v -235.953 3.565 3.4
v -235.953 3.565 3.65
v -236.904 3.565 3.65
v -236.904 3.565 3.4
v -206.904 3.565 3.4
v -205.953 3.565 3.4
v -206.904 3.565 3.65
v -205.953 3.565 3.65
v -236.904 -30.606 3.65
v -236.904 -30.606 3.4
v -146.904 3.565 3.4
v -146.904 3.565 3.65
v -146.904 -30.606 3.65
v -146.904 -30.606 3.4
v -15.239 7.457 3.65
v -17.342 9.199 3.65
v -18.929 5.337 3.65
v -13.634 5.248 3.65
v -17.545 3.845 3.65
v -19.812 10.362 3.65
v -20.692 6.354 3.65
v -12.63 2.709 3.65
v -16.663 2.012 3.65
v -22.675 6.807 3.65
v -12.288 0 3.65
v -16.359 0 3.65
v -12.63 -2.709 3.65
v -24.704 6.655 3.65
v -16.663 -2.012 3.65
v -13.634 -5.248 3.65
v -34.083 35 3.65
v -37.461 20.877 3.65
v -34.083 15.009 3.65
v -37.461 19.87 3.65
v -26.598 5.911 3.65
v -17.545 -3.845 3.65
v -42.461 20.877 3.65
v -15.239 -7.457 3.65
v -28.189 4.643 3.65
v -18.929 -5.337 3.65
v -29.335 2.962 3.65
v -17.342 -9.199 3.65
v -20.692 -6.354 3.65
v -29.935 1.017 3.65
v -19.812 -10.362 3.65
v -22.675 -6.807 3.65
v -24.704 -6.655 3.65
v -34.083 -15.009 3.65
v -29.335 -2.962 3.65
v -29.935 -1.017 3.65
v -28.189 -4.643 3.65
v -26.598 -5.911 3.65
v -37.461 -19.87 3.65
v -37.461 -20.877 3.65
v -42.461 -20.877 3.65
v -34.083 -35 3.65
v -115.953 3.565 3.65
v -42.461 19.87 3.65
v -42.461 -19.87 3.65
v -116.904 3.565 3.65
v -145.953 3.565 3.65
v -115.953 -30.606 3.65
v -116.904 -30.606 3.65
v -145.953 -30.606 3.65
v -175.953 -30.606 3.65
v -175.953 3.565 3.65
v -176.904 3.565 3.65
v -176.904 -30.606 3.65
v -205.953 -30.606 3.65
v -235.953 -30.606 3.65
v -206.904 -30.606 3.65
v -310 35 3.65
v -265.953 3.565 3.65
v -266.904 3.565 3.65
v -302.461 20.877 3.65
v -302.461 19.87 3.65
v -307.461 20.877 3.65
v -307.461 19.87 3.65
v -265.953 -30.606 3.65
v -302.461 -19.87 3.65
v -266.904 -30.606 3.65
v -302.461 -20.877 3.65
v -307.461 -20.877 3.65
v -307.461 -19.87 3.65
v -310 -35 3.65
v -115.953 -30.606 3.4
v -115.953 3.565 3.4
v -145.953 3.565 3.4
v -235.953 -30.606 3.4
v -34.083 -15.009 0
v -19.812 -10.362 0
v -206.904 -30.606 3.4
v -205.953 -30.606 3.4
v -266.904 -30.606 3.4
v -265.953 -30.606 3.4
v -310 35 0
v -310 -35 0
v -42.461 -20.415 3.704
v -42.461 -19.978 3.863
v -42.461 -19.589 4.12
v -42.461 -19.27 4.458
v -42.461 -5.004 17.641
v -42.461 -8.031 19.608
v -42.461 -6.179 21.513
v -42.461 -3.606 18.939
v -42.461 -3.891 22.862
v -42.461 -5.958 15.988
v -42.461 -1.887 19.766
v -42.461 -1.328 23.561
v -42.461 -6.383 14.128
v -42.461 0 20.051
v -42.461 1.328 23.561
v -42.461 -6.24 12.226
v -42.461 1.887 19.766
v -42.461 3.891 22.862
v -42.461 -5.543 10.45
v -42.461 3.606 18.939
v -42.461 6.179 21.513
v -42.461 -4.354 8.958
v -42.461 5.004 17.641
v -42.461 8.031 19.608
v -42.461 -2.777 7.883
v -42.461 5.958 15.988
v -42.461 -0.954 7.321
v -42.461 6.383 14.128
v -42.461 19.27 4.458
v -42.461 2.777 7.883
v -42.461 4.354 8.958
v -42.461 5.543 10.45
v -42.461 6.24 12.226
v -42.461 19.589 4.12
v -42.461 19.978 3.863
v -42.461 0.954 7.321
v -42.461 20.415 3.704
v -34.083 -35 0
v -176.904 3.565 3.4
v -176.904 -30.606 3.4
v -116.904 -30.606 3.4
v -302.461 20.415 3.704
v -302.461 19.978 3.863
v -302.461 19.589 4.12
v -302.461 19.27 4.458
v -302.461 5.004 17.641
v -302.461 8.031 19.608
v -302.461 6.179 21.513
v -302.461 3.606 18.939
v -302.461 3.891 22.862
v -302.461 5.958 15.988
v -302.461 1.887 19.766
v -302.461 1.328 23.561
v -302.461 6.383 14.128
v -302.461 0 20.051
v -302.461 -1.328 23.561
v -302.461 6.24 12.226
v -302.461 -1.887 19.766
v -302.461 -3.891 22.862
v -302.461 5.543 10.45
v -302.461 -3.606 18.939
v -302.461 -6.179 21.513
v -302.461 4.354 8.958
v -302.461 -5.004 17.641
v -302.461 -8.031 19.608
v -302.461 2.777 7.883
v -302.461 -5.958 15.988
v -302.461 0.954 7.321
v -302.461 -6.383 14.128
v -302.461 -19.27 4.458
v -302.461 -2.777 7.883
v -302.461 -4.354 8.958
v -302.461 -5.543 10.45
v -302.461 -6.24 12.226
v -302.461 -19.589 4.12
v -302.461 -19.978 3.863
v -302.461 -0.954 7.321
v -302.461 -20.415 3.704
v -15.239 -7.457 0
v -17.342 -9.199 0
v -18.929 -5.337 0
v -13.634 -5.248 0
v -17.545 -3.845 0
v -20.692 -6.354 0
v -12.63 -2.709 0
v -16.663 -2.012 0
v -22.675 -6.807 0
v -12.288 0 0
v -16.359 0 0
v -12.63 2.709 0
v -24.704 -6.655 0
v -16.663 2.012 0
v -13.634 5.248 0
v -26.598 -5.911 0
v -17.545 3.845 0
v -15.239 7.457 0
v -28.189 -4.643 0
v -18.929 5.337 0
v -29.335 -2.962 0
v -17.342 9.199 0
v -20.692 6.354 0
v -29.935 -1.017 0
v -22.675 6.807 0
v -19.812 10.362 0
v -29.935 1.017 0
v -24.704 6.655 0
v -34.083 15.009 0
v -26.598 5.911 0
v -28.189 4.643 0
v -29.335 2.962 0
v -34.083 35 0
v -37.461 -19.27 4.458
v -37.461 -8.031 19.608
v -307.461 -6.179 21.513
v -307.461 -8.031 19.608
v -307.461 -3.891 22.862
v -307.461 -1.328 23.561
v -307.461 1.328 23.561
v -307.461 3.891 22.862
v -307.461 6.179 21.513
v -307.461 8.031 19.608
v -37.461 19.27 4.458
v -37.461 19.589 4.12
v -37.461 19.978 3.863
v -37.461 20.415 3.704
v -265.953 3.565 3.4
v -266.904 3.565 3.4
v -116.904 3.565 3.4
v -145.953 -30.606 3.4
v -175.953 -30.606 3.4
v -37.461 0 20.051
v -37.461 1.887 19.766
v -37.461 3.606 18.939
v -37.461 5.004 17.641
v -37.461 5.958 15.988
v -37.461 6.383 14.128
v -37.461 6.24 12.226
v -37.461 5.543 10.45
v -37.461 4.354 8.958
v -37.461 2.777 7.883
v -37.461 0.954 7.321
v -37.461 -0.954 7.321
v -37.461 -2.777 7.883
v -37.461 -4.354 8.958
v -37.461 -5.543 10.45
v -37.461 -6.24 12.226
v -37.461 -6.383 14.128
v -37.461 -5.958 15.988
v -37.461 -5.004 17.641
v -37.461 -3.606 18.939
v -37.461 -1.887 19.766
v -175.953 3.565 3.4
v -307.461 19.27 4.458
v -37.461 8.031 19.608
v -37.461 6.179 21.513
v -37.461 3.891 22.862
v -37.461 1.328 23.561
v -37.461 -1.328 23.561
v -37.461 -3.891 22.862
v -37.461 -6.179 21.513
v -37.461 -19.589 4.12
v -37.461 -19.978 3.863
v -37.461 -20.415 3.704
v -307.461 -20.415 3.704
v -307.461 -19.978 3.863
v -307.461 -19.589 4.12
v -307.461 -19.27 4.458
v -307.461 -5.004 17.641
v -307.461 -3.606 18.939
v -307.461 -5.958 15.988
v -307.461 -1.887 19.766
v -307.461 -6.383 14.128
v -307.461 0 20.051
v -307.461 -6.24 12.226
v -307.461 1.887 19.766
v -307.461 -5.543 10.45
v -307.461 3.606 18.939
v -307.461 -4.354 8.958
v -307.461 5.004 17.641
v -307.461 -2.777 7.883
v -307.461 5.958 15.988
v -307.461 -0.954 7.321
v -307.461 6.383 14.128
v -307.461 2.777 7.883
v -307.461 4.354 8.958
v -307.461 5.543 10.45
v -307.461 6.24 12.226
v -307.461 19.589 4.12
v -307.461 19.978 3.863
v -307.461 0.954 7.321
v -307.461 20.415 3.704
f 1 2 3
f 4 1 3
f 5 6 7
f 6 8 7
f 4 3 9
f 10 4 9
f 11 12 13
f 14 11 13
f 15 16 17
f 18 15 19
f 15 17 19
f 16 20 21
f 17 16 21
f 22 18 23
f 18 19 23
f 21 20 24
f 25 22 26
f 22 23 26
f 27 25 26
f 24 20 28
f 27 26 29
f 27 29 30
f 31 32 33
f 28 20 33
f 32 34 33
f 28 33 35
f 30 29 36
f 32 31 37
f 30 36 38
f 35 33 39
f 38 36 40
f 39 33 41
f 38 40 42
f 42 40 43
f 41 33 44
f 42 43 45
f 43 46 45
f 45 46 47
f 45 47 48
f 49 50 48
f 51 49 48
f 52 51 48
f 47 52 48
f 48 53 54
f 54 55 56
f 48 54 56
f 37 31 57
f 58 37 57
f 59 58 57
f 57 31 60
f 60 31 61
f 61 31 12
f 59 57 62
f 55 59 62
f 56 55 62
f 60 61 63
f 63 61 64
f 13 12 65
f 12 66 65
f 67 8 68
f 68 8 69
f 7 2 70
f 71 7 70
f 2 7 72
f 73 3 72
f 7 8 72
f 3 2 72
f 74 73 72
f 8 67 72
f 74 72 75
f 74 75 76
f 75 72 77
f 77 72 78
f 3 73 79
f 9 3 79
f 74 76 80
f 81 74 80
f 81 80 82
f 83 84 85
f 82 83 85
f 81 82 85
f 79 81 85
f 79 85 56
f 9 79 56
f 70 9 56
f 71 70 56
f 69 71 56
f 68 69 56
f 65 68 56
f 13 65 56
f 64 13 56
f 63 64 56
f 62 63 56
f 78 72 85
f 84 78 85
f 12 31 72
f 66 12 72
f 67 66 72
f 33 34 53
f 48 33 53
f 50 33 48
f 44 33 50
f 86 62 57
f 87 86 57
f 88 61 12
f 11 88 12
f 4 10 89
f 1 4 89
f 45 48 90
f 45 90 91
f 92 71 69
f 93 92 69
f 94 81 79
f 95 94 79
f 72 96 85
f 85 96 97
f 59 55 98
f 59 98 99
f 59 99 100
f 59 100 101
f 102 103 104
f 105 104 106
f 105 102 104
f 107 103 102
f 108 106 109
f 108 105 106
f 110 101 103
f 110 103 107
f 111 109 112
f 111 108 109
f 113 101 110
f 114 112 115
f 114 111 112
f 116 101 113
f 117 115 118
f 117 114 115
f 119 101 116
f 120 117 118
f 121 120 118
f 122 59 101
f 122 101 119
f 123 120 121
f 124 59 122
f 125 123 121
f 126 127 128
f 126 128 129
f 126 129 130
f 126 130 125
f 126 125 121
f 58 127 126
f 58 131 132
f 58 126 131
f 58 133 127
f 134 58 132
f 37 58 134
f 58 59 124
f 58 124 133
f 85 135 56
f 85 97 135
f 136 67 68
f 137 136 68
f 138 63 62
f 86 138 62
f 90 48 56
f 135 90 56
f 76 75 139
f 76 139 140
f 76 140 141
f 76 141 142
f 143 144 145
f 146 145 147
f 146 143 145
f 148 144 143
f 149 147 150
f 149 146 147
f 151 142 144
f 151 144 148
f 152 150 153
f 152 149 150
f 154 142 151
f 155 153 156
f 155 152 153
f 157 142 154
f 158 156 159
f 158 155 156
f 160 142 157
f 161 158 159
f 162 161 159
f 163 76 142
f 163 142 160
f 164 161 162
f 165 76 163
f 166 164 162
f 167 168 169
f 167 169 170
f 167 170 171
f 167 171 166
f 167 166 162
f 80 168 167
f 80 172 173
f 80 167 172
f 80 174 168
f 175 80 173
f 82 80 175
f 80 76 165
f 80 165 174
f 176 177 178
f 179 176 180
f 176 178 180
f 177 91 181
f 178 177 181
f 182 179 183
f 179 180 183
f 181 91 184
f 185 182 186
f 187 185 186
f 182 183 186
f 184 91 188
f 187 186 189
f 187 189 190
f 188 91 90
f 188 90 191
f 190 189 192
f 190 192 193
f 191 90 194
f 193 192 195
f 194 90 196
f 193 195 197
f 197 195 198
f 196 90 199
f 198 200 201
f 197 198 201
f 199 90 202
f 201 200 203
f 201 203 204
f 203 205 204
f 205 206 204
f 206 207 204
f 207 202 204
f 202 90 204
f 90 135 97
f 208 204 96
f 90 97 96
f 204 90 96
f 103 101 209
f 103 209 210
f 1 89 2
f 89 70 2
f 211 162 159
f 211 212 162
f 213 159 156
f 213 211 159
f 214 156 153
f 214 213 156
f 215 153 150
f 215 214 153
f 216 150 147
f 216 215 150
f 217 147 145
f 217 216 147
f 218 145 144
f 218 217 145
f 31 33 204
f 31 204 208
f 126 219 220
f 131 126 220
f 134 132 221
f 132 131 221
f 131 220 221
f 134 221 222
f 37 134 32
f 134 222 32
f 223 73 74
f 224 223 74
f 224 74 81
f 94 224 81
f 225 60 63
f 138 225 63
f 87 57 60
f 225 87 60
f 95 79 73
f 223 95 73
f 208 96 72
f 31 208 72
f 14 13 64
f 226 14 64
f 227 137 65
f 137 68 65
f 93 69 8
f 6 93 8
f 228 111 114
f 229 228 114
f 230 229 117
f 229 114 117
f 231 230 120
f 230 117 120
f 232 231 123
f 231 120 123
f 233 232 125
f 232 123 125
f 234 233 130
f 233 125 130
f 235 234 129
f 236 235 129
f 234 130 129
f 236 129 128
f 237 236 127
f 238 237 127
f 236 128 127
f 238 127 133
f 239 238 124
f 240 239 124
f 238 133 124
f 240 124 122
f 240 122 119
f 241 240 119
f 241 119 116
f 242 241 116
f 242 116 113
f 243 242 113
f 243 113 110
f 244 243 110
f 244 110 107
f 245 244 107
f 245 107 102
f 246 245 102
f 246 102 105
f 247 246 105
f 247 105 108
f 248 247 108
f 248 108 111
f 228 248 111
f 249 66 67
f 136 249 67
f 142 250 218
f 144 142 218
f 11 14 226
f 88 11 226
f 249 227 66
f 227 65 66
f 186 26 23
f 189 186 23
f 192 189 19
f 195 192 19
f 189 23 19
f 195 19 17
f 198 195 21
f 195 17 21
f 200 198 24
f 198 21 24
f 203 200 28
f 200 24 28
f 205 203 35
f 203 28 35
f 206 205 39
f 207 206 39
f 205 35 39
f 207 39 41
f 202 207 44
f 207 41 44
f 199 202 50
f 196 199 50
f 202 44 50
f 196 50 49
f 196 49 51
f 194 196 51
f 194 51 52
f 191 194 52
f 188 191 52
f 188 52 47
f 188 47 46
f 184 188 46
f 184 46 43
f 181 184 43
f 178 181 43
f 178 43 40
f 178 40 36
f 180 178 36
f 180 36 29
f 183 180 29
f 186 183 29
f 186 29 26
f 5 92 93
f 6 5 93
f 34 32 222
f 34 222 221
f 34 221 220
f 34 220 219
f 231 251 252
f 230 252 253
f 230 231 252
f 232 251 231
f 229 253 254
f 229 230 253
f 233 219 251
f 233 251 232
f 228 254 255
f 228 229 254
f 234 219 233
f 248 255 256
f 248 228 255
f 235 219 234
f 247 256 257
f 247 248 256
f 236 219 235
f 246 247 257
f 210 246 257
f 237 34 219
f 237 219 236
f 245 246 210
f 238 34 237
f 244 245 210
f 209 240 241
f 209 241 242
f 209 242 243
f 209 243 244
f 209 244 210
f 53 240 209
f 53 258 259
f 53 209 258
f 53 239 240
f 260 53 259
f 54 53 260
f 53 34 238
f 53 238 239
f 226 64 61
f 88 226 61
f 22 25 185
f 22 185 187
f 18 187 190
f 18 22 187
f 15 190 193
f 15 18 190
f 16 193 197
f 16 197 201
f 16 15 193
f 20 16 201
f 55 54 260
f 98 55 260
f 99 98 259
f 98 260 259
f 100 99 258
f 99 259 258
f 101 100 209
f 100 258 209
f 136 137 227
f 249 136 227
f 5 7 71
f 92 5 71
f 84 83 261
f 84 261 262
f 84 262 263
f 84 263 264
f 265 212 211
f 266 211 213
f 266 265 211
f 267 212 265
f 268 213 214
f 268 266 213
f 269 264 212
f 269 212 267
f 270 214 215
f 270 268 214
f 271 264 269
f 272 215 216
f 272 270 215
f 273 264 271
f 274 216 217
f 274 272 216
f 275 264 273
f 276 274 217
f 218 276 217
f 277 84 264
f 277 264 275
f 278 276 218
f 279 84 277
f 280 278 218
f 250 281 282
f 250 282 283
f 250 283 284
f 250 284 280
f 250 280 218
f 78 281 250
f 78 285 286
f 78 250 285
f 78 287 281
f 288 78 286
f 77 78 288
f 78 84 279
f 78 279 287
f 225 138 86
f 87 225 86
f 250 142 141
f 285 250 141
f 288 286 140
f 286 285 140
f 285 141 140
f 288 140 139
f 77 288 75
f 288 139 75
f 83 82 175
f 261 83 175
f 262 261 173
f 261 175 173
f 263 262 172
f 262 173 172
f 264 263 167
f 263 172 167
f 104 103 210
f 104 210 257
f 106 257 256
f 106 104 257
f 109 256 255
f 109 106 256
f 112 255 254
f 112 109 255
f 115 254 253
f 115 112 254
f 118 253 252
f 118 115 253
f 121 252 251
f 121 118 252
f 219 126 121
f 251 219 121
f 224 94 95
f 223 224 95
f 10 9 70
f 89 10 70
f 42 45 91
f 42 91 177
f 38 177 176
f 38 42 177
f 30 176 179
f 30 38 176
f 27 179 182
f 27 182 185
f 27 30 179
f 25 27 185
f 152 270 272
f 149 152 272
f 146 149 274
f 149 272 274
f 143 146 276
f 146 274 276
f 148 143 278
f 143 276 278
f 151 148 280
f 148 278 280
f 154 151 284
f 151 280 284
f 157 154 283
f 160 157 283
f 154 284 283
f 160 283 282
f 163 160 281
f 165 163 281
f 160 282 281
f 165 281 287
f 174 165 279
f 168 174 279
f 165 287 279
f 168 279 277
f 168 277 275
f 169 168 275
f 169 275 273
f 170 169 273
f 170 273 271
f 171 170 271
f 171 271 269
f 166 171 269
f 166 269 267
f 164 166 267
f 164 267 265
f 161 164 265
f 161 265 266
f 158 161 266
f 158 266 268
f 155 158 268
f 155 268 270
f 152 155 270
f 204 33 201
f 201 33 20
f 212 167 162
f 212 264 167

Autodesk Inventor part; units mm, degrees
ref_plane "YZ Plane" through (0, 0, 0) normal (1, 0, 0) x (0, 1, 0)
ref_plane "XZ Plane" through (0, 0, 0) normal (0, 1, 0) x (-1, 0, 0)
ref_plane "XY Plane" through (0, 0, 0) normal (0, 0, 1) x (1, 0, 0)
sketch "Sketch1" plane through (0, 0, 0) normal (0, 0, 1) x (1, 0, 0)
  point P0 (0, 0)
sketch "Sketch2" plane through (0, 0, 0) normal (0, 0, 1) x (1, 0, 0)
  line L0 (-30, 35) -> (-310, 35)
  line L1 (-310, 35) -> (-310, -35)
  line L2 (-310, -35) -> (-30, -35)
  line L3 (-30, -35) -> (-30, 35)
  line L4 (-310, 35) -> (-30, -35) construction
  line L5 (-30, 35) -> (-310, -35) construction
  line L6 (0, 0) -> (-620.4685, 0)
  point P0 (-170, 0)
  dimension "d0" = 280
  dimension "d1" = 70
  dimension "d2" = 30
extrude "Extrusion1" add sketch "Sketch2" along normal blind 3.65
sketch "Sketch3" plane through (0, 0, 3.65) normal (0, 0, 1) x (1, 0, 0)
  line L0 (-30, 35) -> (-30, -35) projected
  line L1 (-310, -35) -> (-310, 35) projected
  line L2 (-30, 0) -> (-310, 0) construction
  line L3 (-42.4613, 25) -> (-37.4613, 25)
  line L4 (-37.4613, 25) -> (-37.4613, -25)
  line L5 (-37.4613, -25) -> (-42.4613, -25)
  line L6 (-42.4613, -25) -> (-42.4613, 25)
  line L7 (-37.4613, 25) -> (-42.4613, -25) construction
  line L8 (-42.4613, 25) -> (-37.4613, -25) construction
  point P0 (0, 0)
  point P1 (-39.9613, 0)
  dimension "d5" = 5
  dimension "d6" = 50
extrude "Extrusion2" add sketch "Sketch3" along normal blind 35.4
sketch "Sketch4" plane through (-42.4613, -25, 3.65) normal (-1, 0, 0) x (0, 0, 1)
  line L0 (35.4, 0) -> (35.4, 50) projected
  line L1 (0, 50) -> (35.4, 50) projected
  line L2 (0, 0) -> (0, 50) projected
  line L3 (0, 0) -> (35.4, 0) projected
  circle A0 centre (10, 25) radius 10 construction
  line L4 (35.4, 25) -> (-31.6063, 25)
  line L5 (0, 44.8702) -> (15.9582, 33.0312)
  line L6 (0, 5.1298) -> (15.9582, 16.9688)
  circle A1 centre (10, 25) radius 6.4008
  arc A2 (15.9582, 16.9688) -> (15.9582, 33.0312) centre (10, 25) ccw
  line L7 (0, 60) -> (0, -10) projected
  line L8 (0, 50) -> (35.4, 0) construction
  line L9 (35.4, 50) -> (0, 0) construction
  line L10 (0, -10) -> (0, 60) projected
  point P0 (-3.65, 25)
  point P1 (17.7, 25)
  point P2 (17.7, 25)
  dimension "d9" = 20
extrude "Extrusion3" cut sketch "Sketch4" against normal through all contours L3 L2 L6 A2 L4 L0 | L4 A2 L5 L2 L1 L0 | A1 L4 | L4 A1
pattern_linear "Rectangular Pattern1" count 2 spacing 265 along (-1, 0, 0) of "Extrusion3", "Extrusion2"
sketch "Sketch5" plane through (0, 0, 3.65) normal (0, 0, 1) x (1, 0, 0)
  line L0 (-30, -35) -> (-310, -35) projected
  line L1 (-115.953, 3.5653) -> (-116.904, 3.5653)
  line L2 (-116.904, 3.5653) -> (-116.904, -30.6059)
  line L3 (-116.904, -30.6059) -> (-115.953, -30.6059)
  line L4 (-115.953, -30.6059) -> (-115.953, 3.5653)
  line L5 (-85.953, 3.5653) -> (-86.904, 3.5653)
  line L6 (-86.904, 3.5653) -> (-86.904, -30.6059)
  line L7 (-86.904, -30.6059) -> (-85.953, -30.6059)
  line L8 (-85.953, -30.6059) -> (-85.953, 3.5653)
  line L9 (-55.953, 3.5653) -> (-56.904, 3.5653)
  line L10 (-56.904, 3.5653) -> (-56.904, -30.6059)
  line L11 (-56.904, -30.6059) -> (-55.953, -30.6059)
  line L12 (-55.953, -30.6059) -> (-55.953, 3.5653)
  line L13 (-25.953, 3.5653) -> (-26.904, 3.5653)
  line L14 (-26.904, 3.5653) -> (-26.904, -30.6059)
  line L15 (-26.904, -30.6059) -> (-25.953, -30.6059)
  line L16 (-25.953, -30.6059) -> (-25.953, 3.5653)
  line L17 (4.047, 3.5653) -> (3.096, 3.5653)
  line L18 (3.096, 3.5653) -> (3.096, -30.6059)
  line L19 (3.096, -30.6059) -> (4.047, -30.6059)
  line L20 (4.047, -30.6059) -> (4.047, 3.5653)
  line L21 (34.047, 3.5653) -> (33.096, 3.5653)
  line L22 (33.096, 3.5653) -> (33.096, -30.6059)
  line L23 (33.096, -30.6059) -> (34.047, -30.6059)
  line L24 (34.047, -30.6059) -> (34.047, 3.5653)
  point P0 (0, 0)
  dimension "d17" = 30
extrude "Extrusion4" cut sketch "Sketch5" against normal blind 0.25 contours L4 L3 L2 L1
pattern_linear "Rectangular Pattern2" count 6 spacing 30 along (-1, 0, 0) of "Extrusion4"
sketch "Sketch6" plane through (-30, -35, 0) normal (1, 0, 0) x (0, 0, -1)
  line L0 (-3.65, 70) -> (-3.65, 0) projected
  line L1 (0, 0) -> (-3.65, 0) projected
  line L2 (0, 0) -> (0, 70) projected
  line L3 (0, 70) -> (-3.65, 70) projected
  point P0 (0, 35)
extrude "Extrusion5" add sketch "Sketch6" along normal blind 17.7125
sketch "Sketch7" plane through (0, 0, 3.65) normal (0, 0, 1) x (1, 0, 0)
  line L0 (-266.904, -30.6059) -> (-266.904, 3.5653) projected
  line L1 (-266.904, 3.5653) -> (-265.953, 3.5653) projected
  line L2 (-265.953, 3.5653) -> (-265.953, -30.6059) projected
  line L3 (-265.953, -30.6059) -> (-266.904, -30.6059) projected
  line L4 (-236.904, -30.6059) -> (-236.904, 3.5653) projected
  line L5 (-236.904, 3.5653) -> (-235.953, 3.5653) projected
  line L6 (-235.953, 3.5653) -> (-235.953, -30.6059) projected
  line L7 (-235.953, -30.6059) -> (-236.904, -30.6059) projected
  line L8 (-206.904, -30.6059) -> (-206.904, 3.5653) projected
  line L9 (-206.904, 3.5653) -> (-205.953, 3.5653) projected
  line L10 (-205.953, 3.5653) -> (-205.953, -30.6059) projected
  line L11 (-205.953, -30.6059) -> (-206.904, -30.6059) projected
  line L12 (-176.904, -30.6059) -> (-176.904, 3.5653) projected
  line L13 (-176.904, 3.5653) -> (-175.953, 3.5653) projected
  line L14 (-175.953, 3.5653) -> (-175.953, -30.6059) projected
  line L15 (-175.953, -30.6059) -> (-176.904, -30.6059) projected
  line L16 (-146.904, -30.6059) -> (-146.904, 3.5653) projected
  line L17 (-146.904, 3.5653) -> (-145.953, 3.5653) projected
  line L18 (-145.953, 3.5653) -> (-145.953, -30.6059) projected
  line L19 (-145.953, -30.6059) -> (-146.904, -30.6059) projected
  line L20 (-116.904, -30.6059) -> (-116.904, 3.5653) projected
  line L21 (-116.904, 3.5653) -> (-115.953, 3.5653) projected
  line L22 (-115.953, 3.5653) -> (-115.953, -30.6059) projected
  line L23 (-115.953, -30.6059) -> (-116.904, -30.6059) projected
  line L24 (-302.4613, 19.8702) -> (-302.4613, -19.8702) projected
  line L25 (-307.4613, -19.8702) -> (-302.4613, -19.8702) projected
  line L26 (-307.4613, -19.8702) -> (-307.4613, 19.8702) projected
  line L27 (-307.4613, 19.8702) -> (-302.4613, 19.8702) projected
  line L28 (-310, 35) -> (-12.2875, 35) projected
  line L29 (-310, -35) -> (-310, 35) projected
  line L30 (-12.2875, -35) -> (-310, -35) projected
  line L31 (-12.2875, -35) -> (-12.2875, 35) projected
  line L32 (-42.4613, -19.8702) -> (-42.4613, 19.8702) projected
  line L33 (-42.4613, 19.8702) -> (-37.4613, 19.8702) projected
  line L34 (-37.4613, 19.8702) -> (-37.4613, -19.8702) projected
  line L35 (-42.4613, -19.8702) -> (-37.4613, -19.8702) projected
  line L36 (-12.2875, 35) -> (-12.2875, -35)
  circle A0 centre (-23.1854, 0) radius 10.8979 construction
  line L37 (-12.2875, -35) -> (-12.2875, 35) projected
  line L38 (-34.0833, 15.009) -> (-19.8116, 10.3625)
  line L39 (-34.0833, 15.009) -> (-34.0833, 35)
  line L40 (-12.2875, 35) -> (-12.2875, 0)
  arc A1 (-12.2875, 0) -> (-19.8116, 10.3625) centre (-23.1854, 0) ccw
  line L41 (-310, 0) -> (-198.3644, 0)
  circle A2 centre (-23.1854, 0) radius 10.8979 construction
  line L42 (-34.0833, -15.009) -> (-19.8116, -10.3625)
  line L43 (-34.0833, -15.009) -> (-34.0833, -35)
  arc A3 (-19.8116, -10.3625) -> (-12.2875, 0) centre (-23.1854, 0) ccw
  line L44 (-34.0833, 15.009) -> (-34.0833, 35)
  line L45 (-12.2875, 35) -> (-12.2875, 0)
  line L46 (-12.2875, -35) -> (-34.0833, -35)
  circle A4 centre (-23.1854, 0) radius 6.826
extrude "Extrusion6" cut sketch "Sketch7" against normal through all contours L28 L31 A1 L38 L39 | L31 L30 L43 L42 A3 | A4
fillet "Fillet1" radius 2 4 edges at (-39.9613, -19.8702, 3.65) (-39.9613, 19.8702, 3.65) (-304.9613, -19.8702, 3.65) (-304.9613, 19.8702, 3.65)
properties part number "ForceMeterCasing"
